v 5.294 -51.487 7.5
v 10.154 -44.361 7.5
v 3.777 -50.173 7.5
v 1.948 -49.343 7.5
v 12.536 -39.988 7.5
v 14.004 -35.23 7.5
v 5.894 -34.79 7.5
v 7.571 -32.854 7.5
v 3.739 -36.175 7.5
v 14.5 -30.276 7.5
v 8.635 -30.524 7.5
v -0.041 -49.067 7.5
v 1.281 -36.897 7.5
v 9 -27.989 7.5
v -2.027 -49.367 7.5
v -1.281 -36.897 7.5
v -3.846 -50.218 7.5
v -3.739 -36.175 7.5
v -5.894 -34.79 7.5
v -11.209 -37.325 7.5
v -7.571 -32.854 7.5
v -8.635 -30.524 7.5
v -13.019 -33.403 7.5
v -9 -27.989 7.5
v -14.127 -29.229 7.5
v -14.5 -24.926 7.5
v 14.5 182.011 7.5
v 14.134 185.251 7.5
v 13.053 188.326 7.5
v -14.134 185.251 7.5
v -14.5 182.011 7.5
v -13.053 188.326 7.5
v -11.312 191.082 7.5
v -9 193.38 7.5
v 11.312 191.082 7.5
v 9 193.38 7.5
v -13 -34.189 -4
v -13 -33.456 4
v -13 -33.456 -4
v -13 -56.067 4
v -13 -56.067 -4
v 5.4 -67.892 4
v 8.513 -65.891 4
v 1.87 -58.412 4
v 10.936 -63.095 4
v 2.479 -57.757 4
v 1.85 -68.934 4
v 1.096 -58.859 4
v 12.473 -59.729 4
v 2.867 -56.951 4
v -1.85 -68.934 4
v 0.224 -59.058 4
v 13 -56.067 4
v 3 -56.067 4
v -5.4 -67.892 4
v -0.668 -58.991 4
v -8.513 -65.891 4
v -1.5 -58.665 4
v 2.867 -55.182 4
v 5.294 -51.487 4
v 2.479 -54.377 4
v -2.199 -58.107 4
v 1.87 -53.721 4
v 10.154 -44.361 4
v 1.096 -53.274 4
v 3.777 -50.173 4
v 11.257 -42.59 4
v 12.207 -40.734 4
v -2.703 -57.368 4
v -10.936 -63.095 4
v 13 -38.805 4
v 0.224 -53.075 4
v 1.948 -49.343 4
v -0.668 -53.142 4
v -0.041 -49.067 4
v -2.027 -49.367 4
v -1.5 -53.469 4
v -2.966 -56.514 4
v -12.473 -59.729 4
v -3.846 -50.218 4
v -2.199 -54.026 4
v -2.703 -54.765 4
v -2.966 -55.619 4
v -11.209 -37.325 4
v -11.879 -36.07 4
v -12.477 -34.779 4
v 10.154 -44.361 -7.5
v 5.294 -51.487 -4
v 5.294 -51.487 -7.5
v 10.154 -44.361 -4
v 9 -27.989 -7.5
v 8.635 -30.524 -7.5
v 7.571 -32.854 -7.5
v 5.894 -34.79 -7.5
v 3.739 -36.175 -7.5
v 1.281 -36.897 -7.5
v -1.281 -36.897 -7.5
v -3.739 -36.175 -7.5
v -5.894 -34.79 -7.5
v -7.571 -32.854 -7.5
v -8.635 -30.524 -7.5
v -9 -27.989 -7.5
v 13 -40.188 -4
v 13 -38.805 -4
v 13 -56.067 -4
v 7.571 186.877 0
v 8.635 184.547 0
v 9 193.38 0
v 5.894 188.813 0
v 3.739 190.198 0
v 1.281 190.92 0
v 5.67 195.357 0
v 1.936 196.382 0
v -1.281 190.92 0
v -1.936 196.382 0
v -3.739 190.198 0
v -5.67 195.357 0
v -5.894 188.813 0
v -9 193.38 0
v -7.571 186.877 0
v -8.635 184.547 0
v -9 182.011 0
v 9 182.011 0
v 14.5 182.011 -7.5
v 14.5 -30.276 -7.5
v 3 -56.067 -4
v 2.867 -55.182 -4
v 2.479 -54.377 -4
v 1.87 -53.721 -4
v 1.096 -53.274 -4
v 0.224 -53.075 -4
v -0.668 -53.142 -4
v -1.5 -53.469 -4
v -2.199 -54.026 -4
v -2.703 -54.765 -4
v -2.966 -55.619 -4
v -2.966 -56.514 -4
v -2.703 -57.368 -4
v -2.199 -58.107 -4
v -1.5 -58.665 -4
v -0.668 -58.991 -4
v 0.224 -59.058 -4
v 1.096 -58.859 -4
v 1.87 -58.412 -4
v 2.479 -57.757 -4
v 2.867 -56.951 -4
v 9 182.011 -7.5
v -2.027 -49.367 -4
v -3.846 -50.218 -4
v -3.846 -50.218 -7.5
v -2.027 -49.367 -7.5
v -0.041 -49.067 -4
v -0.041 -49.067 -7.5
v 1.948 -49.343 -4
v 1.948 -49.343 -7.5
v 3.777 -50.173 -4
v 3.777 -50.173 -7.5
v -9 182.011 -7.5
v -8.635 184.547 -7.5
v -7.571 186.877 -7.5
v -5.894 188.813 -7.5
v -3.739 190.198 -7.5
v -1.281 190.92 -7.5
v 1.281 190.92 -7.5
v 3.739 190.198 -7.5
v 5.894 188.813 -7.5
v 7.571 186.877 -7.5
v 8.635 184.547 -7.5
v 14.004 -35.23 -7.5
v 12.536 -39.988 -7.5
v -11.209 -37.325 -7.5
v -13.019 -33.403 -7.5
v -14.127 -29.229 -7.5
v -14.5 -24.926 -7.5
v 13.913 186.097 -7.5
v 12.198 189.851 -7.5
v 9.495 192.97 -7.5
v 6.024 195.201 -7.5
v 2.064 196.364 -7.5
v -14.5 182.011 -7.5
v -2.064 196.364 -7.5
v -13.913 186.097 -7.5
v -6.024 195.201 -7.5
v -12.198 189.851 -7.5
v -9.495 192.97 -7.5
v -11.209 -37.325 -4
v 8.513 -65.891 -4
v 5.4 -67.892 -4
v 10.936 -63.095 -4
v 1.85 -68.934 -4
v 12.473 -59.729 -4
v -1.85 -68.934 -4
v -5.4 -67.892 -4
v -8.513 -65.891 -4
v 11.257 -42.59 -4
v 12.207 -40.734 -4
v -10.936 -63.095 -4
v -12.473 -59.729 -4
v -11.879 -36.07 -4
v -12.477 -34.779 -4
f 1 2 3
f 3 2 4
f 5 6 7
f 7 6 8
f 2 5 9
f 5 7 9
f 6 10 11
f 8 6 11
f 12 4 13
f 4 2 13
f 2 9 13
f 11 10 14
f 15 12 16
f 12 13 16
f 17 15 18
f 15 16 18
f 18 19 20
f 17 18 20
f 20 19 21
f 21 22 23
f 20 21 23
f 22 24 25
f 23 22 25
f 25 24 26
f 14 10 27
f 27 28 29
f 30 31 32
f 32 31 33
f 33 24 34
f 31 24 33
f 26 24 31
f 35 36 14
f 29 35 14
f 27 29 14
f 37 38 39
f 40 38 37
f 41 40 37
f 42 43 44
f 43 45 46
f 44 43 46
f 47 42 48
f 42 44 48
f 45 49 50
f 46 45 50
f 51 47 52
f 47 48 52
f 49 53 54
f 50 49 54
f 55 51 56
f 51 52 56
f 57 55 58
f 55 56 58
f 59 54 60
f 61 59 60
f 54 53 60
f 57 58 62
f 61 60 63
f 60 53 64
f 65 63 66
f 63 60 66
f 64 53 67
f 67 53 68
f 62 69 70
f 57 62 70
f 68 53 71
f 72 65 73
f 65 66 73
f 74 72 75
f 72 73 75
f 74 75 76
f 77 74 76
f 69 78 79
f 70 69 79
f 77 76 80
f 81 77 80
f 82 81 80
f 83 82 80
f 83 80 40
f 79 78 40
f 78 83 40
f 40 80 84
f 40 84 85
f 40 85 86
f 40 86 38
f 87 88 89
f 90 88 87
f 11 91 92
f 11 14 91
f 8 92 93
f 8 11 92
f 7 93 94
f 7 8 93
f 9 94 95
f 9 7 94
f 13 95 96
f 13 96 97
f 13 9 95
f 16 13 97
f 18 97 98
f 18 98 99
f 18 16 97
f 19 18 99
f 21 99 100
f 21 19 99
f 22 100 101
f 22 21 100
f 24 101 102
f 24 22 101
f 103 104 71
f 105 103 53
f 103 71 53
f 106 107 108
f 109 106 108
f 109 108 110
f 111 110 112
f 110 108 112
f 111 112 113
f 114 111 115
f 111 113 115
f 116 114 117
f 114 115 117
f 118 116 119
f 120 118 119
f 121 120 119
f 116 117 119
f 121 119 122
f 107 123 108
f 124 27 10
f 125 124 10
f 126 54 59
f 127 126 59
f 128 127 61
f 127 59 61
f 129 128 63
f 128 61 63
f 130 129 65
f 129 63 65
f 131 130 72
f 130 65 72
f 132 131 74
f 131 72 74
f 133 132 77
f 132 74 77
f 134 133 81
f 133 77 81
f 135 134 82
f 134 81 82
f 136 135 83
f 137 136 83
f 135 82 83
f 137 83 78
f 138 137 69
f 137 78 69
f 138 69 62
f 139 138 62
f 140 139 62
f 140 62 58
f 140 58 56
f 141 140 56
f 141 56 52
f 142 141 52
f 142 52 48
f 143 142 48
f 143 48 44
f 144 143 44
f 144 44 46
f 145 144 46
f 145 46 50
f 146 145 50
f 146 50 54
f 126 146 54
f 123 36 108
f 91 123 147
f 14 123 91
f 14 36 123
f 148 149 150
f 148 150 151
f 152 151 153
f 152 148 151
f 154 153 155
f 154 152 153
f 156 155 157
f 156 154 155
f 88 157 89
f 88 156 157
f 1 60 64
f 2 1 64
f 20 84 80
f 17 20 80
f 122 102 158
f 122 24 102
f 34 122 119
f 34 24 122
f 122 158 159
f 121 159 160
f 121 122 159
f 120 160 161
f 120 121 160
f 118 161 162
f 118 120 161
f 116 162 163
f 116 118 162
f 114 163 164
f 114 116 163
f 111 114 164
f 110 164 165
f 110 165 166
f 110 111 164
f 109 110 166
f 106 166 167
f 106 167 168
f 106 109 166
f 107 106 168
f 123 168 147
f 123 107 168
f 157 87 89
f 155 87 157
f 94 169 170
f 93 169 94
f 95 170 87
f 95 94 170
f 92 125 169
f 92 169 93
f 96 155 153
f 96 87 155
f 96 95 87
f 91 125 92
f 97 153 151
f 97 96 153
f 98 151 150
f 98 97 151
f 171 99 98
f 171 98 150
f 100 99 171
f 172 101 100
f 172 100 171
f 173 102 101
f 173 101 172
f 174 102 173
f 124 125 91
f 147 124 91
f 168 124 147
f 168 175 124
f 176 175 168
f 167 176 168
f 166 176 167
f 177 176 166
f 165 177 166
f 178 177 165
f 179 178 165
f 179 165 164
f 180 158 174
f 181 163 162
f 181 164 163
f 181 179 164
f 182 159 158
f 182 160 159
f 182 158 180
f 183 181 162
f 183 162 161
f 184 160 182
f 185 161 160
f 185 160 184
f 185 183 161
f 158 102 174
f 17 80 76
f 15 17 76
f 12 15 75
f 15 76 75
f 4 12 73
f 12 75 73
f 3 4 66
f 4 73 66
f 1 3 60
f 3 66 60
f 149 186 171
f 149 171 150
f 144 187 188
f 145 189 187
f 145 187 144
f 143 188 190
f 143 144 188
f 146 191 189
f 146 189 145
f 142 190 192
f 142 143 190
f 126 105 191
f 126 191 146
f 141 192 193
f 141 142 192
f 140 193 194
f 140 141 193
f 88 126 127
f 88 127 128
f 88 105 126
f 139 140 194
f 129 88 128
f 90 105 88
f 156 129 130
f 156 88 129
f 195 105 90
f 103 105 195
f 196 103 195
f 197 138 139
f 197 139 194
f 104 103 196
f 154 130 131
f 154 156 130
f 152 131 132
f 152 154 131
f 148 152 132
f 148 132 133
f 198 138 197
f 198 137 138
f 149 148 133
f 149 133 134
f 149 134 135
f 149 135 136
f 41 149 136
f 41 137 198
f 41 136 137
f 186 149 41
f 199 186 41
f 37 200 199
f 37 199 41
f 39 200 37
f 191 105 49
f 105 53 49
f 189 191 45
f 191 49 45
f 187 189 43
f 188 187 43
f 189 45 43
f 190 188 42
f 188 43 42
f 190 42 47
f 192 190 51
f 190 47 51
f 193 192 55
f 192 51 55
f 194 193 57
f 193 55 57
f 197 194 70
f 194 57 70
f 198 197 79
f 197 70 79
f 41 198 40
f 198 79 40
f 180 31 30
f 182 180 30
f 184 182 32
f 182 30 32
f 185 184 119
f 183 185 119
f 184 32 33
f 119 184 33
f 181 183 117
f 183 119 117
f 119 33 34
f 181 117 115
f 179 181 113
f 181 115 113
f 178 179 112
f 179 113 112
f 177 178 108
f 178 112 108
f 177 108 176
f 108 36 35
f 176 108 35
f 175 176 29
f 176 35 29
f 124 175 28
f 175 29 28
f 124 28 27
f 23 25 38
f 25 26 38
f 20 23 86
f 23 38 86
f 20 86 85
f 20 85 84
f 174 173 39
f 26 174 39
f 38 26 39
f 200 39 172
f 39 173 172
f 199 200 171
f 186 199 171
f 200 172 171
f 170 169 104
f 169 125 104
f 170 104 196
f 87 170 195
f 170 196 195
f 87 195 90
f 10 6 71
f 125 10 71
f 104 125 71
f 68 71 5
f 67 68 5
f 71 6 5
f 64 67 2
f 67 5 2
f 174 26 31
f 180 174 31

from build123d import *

# Parameters (mm, degrees)
ESTRUSIONE_ESTRUSIONE1_DEPTH = 7.5
ESTRUSIONE_ESTRUSIONE2_DEPTH = 4
TAGLIO_ESTRUSIONE1_DEPTH     = 198.380910943
TAGLIO_ESTRUSIONE2_DEPTH     = 198.380910943
RACCORDO1_R                  = 25
TAGLIO_ESTRUSIONE3_DEPTH     = 7.5
TAGLIO_ESTRUSIONE4_DEPTH     = 7.5
SCHIZZO6_R                   = 3
TAGLIO_ESTRUSIONE5_DEPTH     = 198.380910943


with BuildPart() as part:
    # Schizzo1 → Estrusione-Estrusione1 (new, symmetric)
    with BuildSketch(Plane.XY):
        with BuildLine():
            Line((14.5, 182.011383906), (14.5, -37.988616094))
            ThreePointArc((14.5, -37.988616094), (0, -52.488616094), (-14.5, -37.988616094))
            Line((-14.5, -37.988616094), (-14.5, 182.011383906))
            ThreePointArc((-14.5, 182.011383906), (0, 196.511383906), (14.5, 182.011383906))
        make_face()
    extrude(amount=ESTRUSIONE_ESTRUSIONE1_DEPTH, both=True)

    # Schizzo2 → Estrusione-Estrusione2 (add, symmetric)
    with BuildSketch(Plane.XY):
        with BuildLine():
            Line((13, -40.066616094), (13, -56.066616094))
            ThreePointArc((13, -56.066616094), (0, -69.066616094), (-13, -56.066616094))
            Line((-13, -56.066616094), (-13, -40.066616094))
            ThreePointArc((-13, -40.066616094), (0, -27.066616094), (13, -40.066616094))
        make_face()
    extrude(amount=ESTRUSIONE_ESTRUSIONE2_DEPTH, both=True)

    # Schizzo4 → Taglio-Estrusione1 (cut, through all)
    with BuildSketch(Plane.XY.offset(4)):
        with BuildLine():
            Line((5.29445937, -51.487456784), (14.5, -37.988616094))
            Line((14.5, -37.988616094), (21.494330869, -44.738036439))
            Line((21.494330869, -44.738036439), (5.386515672, -60.537124892))
            ThreePointArc((5.386515672, -60.537124892), (0.071202698, -63.066253954), (-5.29445937, -60.645775404))
            Line((-5.29445937, -60.645775404), (-28.596127717, -39.453615031))
            Line((-28.596127717, -39.453615031), (-14.5, -31.562211214))
            Line((-14.5, -31.562211214), (-3.845832517, -50.217721134))
            ThreePointArc((-3.845832517, -50.217721134), (0.963165144, -49.133196093), (5.29445937, -51.487456784))
        make_face()
    taglio_estrusione1 = extrude(amount=TAGLIO_ESTRUSIONE1_DEPTH, mode=Mode.SUBTRACT)

    # Specchia1: Taglio-Estrusione1 across plane
    add(taglio_estrusione1.mirror(Plane.XY), mode=Mode.SUBTRACT)

    # Schizzo5 → Taglio-Estrusione2 (cut, through all)
    with BuildSketch(Plane.XY.offset(4)):
        Polygon((-13, -44.411232383), (-13, -34.188720036), (-15.056335757, -30.588064032), (-15.056335757, -43.619366988), align=None)
        Polygon((13, -44.411232383), (13, -40.188189356), (17.407959402, -33.724436261), (17.407959402, -44.411232383), align=None)
    extrude(amount=-TAGLIO_ESTRUSIONE2_DEPTH, mode=Mode.SUBTRACT)

    # Raccordo1
    # the kernel refuses this fillet: 25 mm, written as the material it takes off along each edge
    with BuildSketch(Plane(origin=(-14.5, -31.562211214, -24.089497944), x_dir=(0.4959240379913526, -0.8683659070589721, 0), z_dir=(0, 0, 1))) as raccordo1_piece_1_section:
        with BuildLine():
            CenterArc((RACCORDO1_R * 0.26543196711, RACCORDO1_R), RACCORDO1_R, 240.269299078, 29.730700922)
            Line((-RACCORDO1_R * 0.230492070882, RACCORDO1_R * 0.131634092941), (0, 0))
            Line((0, 0), (RACCORDO1_R * 0.26543196711, 0))
        make_face()
    raccordo1_piece_1 = extrude(amount=48.178995889, mode=Mode.PRIVATE)
    raccordo1_piece_1 = split(raccordo1_piece_1, bisect_by=Plane(origin=(-13, -35.788331904, -14.044748972), z_dir=(1, 0, 0)), keep=Keep.TOP, mode=Mode.PRIVATE)
    raccordo1_piece_1 = split(raccordo1_piece_1, bisect_by=Plane(origin=(-12.28179921, -35.788331904, -4), z_dir=(0, 0, -1)), keep=Keep.TOP, mode=Mode.PRIVATE)
    add(raccordo1_piece_1, mode=Mode.SUBTRACT)
    with BuildSketch(Plane(origin=(-14.5, -31.562211214, -24.089497944), x_dir=(0.4959240379913526, -0.8683659070589721, 0), z_dir=(0, 0, 1))) as raccordo1_piece_2_section:
        with BuildLine():
            CenterArc((RACCORDO1_R * 0.26543196711, RACCORDO1_R), RACCORDO1_R, 240.269299078, 29.730700922)
            Line((-RACCORDO1_R * 0.230492070882, RACCORDO1_R * 0.131634092941), (0, 0))
            Line((0, 0), (RACCORDO1_R * 0.26543196711, 0))
        make_face()
    raccordo1_piece_2 = extrude(amount=48.178995889, mode=Mode.PRIVATE)
    raccordo1_piece_2 = split(raccordo1_piece_2, bisect_by=Plane(origin=(-13, -30.370530988, -14.044748972), z_dir=(-1, 0, 0)), keep=Keep.TOP, mode=Mode.PRIVATE)
    raccordo1_piece_2 = split(raccordo1_piece_2, bisect_by=Plane(origin=(-14.266276842, -30.370530988, -4), z_dir=(0, 0, -1)), keep=Keep.TOP, mode=Mode.PRIVATE)
    add(raccordo1_piece_2, mode=Mode.SUBTRACT)
    with BuildSketch(Plane(origin=(-14.5, -31.562211214, -24.089497944), x_dir=(0.4959240379913526, -0.8683659070589721, 0), z_dir=(0, 0, 1))) as raccordo1_piece_3_section:
        with BuildLine():
            CenterArc((RACCORDO1_R * 0.26543196711, RACCORDO1_R), RACCORDO1_R, 240.269299078, 29.730700922)
            Line((-RACCORDO1_R * 0.230492070882, RACCORDO1_R * 0.131634092941), (0, 0))
            Line((0, 0), (RACCORDO1_R * 0.26543196711, 0))
        make_face()
    raccordo1_piece_3 = extrude(amount=48.178995889, mode=Mode.PRIVATE)
    raccordo1_piece_3 = split(raccordo1_piece_3, bisect_by=Plane(origin=(-14.266276842, -30.370530988, 4), z_dir=(0, 0, -1)), keep=Keep.TOP, mode=Mode.PRIVATE)
    raccordo1_piece_3 = split(raccordo1_piece_3, bisect_by=Plane(origin=(-13, -30.370530988, 0), z_dir=(-1, 0, 0)), keep=Keep.TOP, mode=Mode.PRIVATE)
    raccordo1_piece_3 = split(raccordo1_piece_3, bisect_by=Plane(origin=(-14.266276842, -30.370530988, -4), z_dir=(0, 0, 1)), keep=Keep.TOP, mode=Mode.PRIVATE)
    add(raccordo1_piece_3, mode=Mode.SUBTRACT)
    with BuildSketch(Plane(origin=(-14.5, -31.562211214, -24.089497944), x_dir=(0.4959240379913526, -0.8683659070589721, 0), z_dir=(0, 0, 1))) as raccordo1_piece_4_section:
        with BuildLine():
            CenterArc((RACCORDO1_R * 0.26543196711, RACCORDO1_R), RACCORDO1_R, 240.269299078, 29.730700922)
            Line((-RACCORDO1_R * 0.230492070882, RACCORDO1_R * 0.131634092941), (0, 0))
            Line((0, 0), (RACCORDO1_R * 0.26543196711, 0))
        make_face()
    raccordo1_piece_4 = extrude(amount=48.178995889, mode=Mode.PRIVATE)
    raccordo1_piece_4 = split(raccordo1_piece_4, bisect_by=Plane(origin=(-12.28179921, -35.788331904, 4), z_dir=(0, 0, 1)), keep=Keep.TOP, mode=Mode.PRIVATE)
    raccordo1_piece_4 = split(raccordo1_piece_4, bisect_by=Plane(origin=(-13, -35.788331904, 14.044748972), z_dir=(1, 0, 0)), keep=Keep.TOP, mode=Mode.PRIVATE)
    add(raccordo1_piece_4, mode=Mode.SUBTRACT)
    with BuildSketch(Plane(origin=(-14.5, -31.562211214, -24.089497944), x_dir=(0.4959240379913526, -0.8683659070589721, 0), z_dir=(0, 0, 1))) as raccordo1_piece_5_section:
        with BuildLine():
            CenterArc((RACCORDO1_R * 0.26543196711, RACCORDO1_R), RACCORDO1_R, 240.269299078, 29.730700922)
            Line((-RACCORDO1_R * 0.230492070882, RACCORDO1_R * 0.131634092941), (0, 0))
            Line((0, 0), (RACCORDO1_R * 0.26543196711, 0))
        make_face()
    raccordo1_piece_5 = extrude(amount=48.178995889, mode=Mode.PRIVATE)
    raccordo1_piece_5 = split(raccordo1_piece_5, bisect_by=Plane(origin=(-14.266276842, -30.370530988, 4), z_dir=(0, 0, 1)), keep=Keep.TOP, mode=Mode.PRIVATE)
    raccordo1_piece_5 = split(raccordo1_piece_5, bisect_by=Plane(origin=(-13, -30.370530988, 14.044748972), z_dir=(-1, 0, 0)), keep=Keep.TOP, mode=Mode.PRIVATE)
    add(raccordo1_piece_5, mode=Mode.SUBTRACT)
    with BuildSketch(Plane(origin=(14.5, -37.988616094, 26.782481556), x_dir=(0, 1, 0), z_dir=(0, 0, -1))) as raccordo1_piece_6_section:
        with BuildLine():
            CenterArc((RACCORDO1_R * 0.308519704891, -RACCORDO1_R), RACCORDO1_R, 90, 34.292050498)
            Line((-RACCORDO1_R * 0.254891721625, -RACCORDO1_R * 0.173823527041), (0, 0))
            Line((0, 0), (RACCORDO1_R * 0.308519704891, 0))
        make_face()
    raccordo1_piece_6 = extrude(amount=53.564963111, mode=Mode.PRIVATE)
    raccordo1_piece_6 = split(raccordo1_piece_6, bisect_by=Plane(origin=(14.242102238, -36.251699178, 4), z_dir=(0, 0, 1)), keep=Keep.TOP, mode=Mode.PRIVATE)
    raccordo1_piece_6 = split(raccordo1_piece_6, bisect_by=Plane(origin=(13, -36.251699178, 15.391240778), z_dir=(1, 0, 0)), keep=Keep.TOP, mode=Mode.PRIVATE)
    add(raccordo1_piece_6, mode=Mode.SUBTRACT)
    with BuildSketch(Plane(origin=(14.5, -37.988616094, 26.782481556), x_dir=(0, 1, 0), z_dir=(0, 0, -1))) as raccordo1_piece_7_section:
        with BuildLine():
            CenterArc((RACCORDO1_R * 0.308519704891, -RACCORDO1_R), RACCORDO1_R, 90, 34.292050498)
            Line((-RACCORDO1_R * 0.254891721625, -RACCORDO1_R * 0.173823527041), (0, 0))
            Line((0, 0), (RACCORDO1_R * 0.308519704891, 0))
        make_face()
    raccordo1_piece_7 = extrude(amount=53.564963111, mode=Mode.PRIVATE)
    raccordo1_piece_7 = split(raccordo1_piece_7, bisect_by=Plane(origin=(11.895384145, -41.966992208, 4), z_dir=(0, 0, 1)), keep=Keep.TOP, mode=Mode.PRIVATE)
    raccordo1_piece_7 = split(raccordo1_piece_7, bisect_by=Plane(origin=(13, -41.966992208, 15.391240778), z_dir=(-1, 0, 0)), keep=Keep.TOP, mode=Mode.PRIVATE)
    add(raccordo1_piece_7, mode=Mode.SUBTRACT)
    with BuildSketch(Plane(origin=(14.5, -37.988616094, 26.782481556), x_dir=(0, 1, 0), z_dir=(0, 0, -1))) as raccordo1_piece_8_section:
        with BuildLine():
            CenterArc((RACCORDO1_R * 0.308519704891, -RACCORDO1_R), RACCORDO1_R, 90, 34.292050498)
            Line((-RACCORDO1_R * 0.254891721625, -RACCORDO1_R * 0.173823527041), (0, 0))
            Line((0, 0), (RACCORDO1_R * 0.308519704891, 0))
        make_face()
    raccordo1_piece_8 = extrude(amount=53.564963111, mode=Mode.PRIVATE)
    raccordo1_piece_8 = split(raccordo1_piece_8, bisect_by=Plane(origin=(14.242102238, -36.251699178, 4), z_dir=(0, 0, -1)), keep=Keep.TOP, mode=Mode.PRIVATE)
    raccordo1_piece_8 = split(raccordo1_piece_8, bisect_by=Plane(origin=(14.242102238, -36.251699178, -4), z_dir=(0, 0, 1)), keep=Keep.TOP, mode=Mode.PRIVATE)
    raccordo1_piece_8 = split(raccordo1_piece_8, bisect_by=Plane(origin=(13, -36.251699178, 0), z_dir=(1, 0, 0)), keep=Keep.TOP, mode=Mode.PRIVATE)
    add(raccordo1_piece_8, mode=Mode.SUBTRACT)
    with BuildSketch(Plane(origin=(14.5, -37.988616094, 26.782481556), x_dir=(0, 1, 0), z_dir=(0, 0, -1))) as raccordo1_piece_9_section:
        with BuildLine():
            CenterArc((RACCORDO1_R * 0.308519704891, -RACCORDO1_R), RACCORDO1_R, 90, 34.292050498)
            Line((-RACCORDO1_R * 0.254891721625, -RACCORDO1_R * 0.173823527041), (0, 0))
            Line((0, 0), (RACCORDO1_R * 0.308519704891, 0))
        make_face()
    raccordo1_piece_9 = extrude(amount=53.564963111, mode=Mode.PRIVATE)
    raccordo1_piece_9 = split(raccordo1_piece_9, bisect_by=Plane(origin=(14.242102238, -36.251699178, -4), z_dir=(0, 0, -1)), keep=Keep.TOP, mode=Mode.PRIVATE)
    raccordo1_piece_9 = split(raccordo1_piece_9, bisect_by=Plane(origin=(13, -36.251699178, -15.391240778), z_dir=(1, 0, 0)), keep=Keep.TOP, mode=Mode.PRIVATE)
    add(raccordo1_piece_9, mode=Mode.SUBTRACT)
    with BuildSketch(Plane(origin=(14.5, -37.988616094, 26.782481556), x_dir=(0, 1, 0), z_dir=(0, 0, -1))) as raccordo1_piece_10_section:
        with BuildLine():
            CenterArc((RACCORDO1_R * 0.308519704891, -RACCORDO1_R), RACCORDO1_R, 90, 34.292050498)
            Line((-RACCORDO1_R * 0.254891721625, -RACCORDO1_R * 0.173823527041), (0, 0))
            Line((0, 0), (RACCORDO1_R * 0.308519704891, 0))
        make_face()
    raccordo1_piece_10 = extrude(amount=53.564963111, mode=Mode.PRIVATE)
    raccordo1_piece_10 = split(raccordo1_piece_10, bisect_by=Plane(origin=(11.895384145, -41.966992208, -4), z_dir=(0, 0, -1)), keep=Keep.TOP, mode=Mode.PRIVATE)
    raccordo1_piece_10 = split(raccordo1_piece_10, bisect_by=Plane(origin=(13, -41.966992208, -15.391240778), z_dir=(-1, 0, 0)), keep=Keep.TOP, mode=Mode.PRIVATE)
    add(raccordo1_piece_10, mode=Mode.SUBTRACT)

    # Schizzo8 → Taglio-Estrusione3 (cut, symmetric)
    with BuildSketch(Plane.XY):
        with BuildLine():
            Line((9, 182.011383906), (9, -27.988616094))
            ThreePointArc((9, -27.988616094), (0, -36.988616094), (-9, -27.988616094))
            Line((-9, -27.988616094), (-9, 182.011383906))
            ThreePointArc((-9, 182.011383906), (0, 191.011383906), (9, 182.011383906))
        make_face()
    extrude(amount=TAGLIO_ESTRUSIONE3_DEPTH, both=True, mode=Mode.SUBTRACT)

    # Schizzo9 → Taglio-Estrusione4 (cut)
    with BuildSketch(Plane.XY.offset(7.5)):
        with BuildLine():
            Line((-9, 182.011383906), (-9, 202.011383906))
            ThreePointArc((-9, 202.011383906), (0, 211.011383906), (9, 202.011383906))
            Line((9, 202.011383906), (9, 182.011383906))
            ThreePointArc((9, 182.011383906), (0, 173.011383906), (-9, 182.011383906))
        make_face()
    extrude(amount=-TAGLIO_ESTRUSIONE4_DEPTH, mode=Mode.SUBTRACT)

    # Schizzo6 → Taglio-Estrusione5 (cut, through all)
    with BuildSketch(Plane.XY.offset(4)):
        with Locations((0, -56.066616094)):
            Circle(SCHIZZO6_R)
    extrude(amount=-TAGLIO_ESTRUSIONE5_DEPTH, mode=Mode.SUBTRACT)


solid = part.part
